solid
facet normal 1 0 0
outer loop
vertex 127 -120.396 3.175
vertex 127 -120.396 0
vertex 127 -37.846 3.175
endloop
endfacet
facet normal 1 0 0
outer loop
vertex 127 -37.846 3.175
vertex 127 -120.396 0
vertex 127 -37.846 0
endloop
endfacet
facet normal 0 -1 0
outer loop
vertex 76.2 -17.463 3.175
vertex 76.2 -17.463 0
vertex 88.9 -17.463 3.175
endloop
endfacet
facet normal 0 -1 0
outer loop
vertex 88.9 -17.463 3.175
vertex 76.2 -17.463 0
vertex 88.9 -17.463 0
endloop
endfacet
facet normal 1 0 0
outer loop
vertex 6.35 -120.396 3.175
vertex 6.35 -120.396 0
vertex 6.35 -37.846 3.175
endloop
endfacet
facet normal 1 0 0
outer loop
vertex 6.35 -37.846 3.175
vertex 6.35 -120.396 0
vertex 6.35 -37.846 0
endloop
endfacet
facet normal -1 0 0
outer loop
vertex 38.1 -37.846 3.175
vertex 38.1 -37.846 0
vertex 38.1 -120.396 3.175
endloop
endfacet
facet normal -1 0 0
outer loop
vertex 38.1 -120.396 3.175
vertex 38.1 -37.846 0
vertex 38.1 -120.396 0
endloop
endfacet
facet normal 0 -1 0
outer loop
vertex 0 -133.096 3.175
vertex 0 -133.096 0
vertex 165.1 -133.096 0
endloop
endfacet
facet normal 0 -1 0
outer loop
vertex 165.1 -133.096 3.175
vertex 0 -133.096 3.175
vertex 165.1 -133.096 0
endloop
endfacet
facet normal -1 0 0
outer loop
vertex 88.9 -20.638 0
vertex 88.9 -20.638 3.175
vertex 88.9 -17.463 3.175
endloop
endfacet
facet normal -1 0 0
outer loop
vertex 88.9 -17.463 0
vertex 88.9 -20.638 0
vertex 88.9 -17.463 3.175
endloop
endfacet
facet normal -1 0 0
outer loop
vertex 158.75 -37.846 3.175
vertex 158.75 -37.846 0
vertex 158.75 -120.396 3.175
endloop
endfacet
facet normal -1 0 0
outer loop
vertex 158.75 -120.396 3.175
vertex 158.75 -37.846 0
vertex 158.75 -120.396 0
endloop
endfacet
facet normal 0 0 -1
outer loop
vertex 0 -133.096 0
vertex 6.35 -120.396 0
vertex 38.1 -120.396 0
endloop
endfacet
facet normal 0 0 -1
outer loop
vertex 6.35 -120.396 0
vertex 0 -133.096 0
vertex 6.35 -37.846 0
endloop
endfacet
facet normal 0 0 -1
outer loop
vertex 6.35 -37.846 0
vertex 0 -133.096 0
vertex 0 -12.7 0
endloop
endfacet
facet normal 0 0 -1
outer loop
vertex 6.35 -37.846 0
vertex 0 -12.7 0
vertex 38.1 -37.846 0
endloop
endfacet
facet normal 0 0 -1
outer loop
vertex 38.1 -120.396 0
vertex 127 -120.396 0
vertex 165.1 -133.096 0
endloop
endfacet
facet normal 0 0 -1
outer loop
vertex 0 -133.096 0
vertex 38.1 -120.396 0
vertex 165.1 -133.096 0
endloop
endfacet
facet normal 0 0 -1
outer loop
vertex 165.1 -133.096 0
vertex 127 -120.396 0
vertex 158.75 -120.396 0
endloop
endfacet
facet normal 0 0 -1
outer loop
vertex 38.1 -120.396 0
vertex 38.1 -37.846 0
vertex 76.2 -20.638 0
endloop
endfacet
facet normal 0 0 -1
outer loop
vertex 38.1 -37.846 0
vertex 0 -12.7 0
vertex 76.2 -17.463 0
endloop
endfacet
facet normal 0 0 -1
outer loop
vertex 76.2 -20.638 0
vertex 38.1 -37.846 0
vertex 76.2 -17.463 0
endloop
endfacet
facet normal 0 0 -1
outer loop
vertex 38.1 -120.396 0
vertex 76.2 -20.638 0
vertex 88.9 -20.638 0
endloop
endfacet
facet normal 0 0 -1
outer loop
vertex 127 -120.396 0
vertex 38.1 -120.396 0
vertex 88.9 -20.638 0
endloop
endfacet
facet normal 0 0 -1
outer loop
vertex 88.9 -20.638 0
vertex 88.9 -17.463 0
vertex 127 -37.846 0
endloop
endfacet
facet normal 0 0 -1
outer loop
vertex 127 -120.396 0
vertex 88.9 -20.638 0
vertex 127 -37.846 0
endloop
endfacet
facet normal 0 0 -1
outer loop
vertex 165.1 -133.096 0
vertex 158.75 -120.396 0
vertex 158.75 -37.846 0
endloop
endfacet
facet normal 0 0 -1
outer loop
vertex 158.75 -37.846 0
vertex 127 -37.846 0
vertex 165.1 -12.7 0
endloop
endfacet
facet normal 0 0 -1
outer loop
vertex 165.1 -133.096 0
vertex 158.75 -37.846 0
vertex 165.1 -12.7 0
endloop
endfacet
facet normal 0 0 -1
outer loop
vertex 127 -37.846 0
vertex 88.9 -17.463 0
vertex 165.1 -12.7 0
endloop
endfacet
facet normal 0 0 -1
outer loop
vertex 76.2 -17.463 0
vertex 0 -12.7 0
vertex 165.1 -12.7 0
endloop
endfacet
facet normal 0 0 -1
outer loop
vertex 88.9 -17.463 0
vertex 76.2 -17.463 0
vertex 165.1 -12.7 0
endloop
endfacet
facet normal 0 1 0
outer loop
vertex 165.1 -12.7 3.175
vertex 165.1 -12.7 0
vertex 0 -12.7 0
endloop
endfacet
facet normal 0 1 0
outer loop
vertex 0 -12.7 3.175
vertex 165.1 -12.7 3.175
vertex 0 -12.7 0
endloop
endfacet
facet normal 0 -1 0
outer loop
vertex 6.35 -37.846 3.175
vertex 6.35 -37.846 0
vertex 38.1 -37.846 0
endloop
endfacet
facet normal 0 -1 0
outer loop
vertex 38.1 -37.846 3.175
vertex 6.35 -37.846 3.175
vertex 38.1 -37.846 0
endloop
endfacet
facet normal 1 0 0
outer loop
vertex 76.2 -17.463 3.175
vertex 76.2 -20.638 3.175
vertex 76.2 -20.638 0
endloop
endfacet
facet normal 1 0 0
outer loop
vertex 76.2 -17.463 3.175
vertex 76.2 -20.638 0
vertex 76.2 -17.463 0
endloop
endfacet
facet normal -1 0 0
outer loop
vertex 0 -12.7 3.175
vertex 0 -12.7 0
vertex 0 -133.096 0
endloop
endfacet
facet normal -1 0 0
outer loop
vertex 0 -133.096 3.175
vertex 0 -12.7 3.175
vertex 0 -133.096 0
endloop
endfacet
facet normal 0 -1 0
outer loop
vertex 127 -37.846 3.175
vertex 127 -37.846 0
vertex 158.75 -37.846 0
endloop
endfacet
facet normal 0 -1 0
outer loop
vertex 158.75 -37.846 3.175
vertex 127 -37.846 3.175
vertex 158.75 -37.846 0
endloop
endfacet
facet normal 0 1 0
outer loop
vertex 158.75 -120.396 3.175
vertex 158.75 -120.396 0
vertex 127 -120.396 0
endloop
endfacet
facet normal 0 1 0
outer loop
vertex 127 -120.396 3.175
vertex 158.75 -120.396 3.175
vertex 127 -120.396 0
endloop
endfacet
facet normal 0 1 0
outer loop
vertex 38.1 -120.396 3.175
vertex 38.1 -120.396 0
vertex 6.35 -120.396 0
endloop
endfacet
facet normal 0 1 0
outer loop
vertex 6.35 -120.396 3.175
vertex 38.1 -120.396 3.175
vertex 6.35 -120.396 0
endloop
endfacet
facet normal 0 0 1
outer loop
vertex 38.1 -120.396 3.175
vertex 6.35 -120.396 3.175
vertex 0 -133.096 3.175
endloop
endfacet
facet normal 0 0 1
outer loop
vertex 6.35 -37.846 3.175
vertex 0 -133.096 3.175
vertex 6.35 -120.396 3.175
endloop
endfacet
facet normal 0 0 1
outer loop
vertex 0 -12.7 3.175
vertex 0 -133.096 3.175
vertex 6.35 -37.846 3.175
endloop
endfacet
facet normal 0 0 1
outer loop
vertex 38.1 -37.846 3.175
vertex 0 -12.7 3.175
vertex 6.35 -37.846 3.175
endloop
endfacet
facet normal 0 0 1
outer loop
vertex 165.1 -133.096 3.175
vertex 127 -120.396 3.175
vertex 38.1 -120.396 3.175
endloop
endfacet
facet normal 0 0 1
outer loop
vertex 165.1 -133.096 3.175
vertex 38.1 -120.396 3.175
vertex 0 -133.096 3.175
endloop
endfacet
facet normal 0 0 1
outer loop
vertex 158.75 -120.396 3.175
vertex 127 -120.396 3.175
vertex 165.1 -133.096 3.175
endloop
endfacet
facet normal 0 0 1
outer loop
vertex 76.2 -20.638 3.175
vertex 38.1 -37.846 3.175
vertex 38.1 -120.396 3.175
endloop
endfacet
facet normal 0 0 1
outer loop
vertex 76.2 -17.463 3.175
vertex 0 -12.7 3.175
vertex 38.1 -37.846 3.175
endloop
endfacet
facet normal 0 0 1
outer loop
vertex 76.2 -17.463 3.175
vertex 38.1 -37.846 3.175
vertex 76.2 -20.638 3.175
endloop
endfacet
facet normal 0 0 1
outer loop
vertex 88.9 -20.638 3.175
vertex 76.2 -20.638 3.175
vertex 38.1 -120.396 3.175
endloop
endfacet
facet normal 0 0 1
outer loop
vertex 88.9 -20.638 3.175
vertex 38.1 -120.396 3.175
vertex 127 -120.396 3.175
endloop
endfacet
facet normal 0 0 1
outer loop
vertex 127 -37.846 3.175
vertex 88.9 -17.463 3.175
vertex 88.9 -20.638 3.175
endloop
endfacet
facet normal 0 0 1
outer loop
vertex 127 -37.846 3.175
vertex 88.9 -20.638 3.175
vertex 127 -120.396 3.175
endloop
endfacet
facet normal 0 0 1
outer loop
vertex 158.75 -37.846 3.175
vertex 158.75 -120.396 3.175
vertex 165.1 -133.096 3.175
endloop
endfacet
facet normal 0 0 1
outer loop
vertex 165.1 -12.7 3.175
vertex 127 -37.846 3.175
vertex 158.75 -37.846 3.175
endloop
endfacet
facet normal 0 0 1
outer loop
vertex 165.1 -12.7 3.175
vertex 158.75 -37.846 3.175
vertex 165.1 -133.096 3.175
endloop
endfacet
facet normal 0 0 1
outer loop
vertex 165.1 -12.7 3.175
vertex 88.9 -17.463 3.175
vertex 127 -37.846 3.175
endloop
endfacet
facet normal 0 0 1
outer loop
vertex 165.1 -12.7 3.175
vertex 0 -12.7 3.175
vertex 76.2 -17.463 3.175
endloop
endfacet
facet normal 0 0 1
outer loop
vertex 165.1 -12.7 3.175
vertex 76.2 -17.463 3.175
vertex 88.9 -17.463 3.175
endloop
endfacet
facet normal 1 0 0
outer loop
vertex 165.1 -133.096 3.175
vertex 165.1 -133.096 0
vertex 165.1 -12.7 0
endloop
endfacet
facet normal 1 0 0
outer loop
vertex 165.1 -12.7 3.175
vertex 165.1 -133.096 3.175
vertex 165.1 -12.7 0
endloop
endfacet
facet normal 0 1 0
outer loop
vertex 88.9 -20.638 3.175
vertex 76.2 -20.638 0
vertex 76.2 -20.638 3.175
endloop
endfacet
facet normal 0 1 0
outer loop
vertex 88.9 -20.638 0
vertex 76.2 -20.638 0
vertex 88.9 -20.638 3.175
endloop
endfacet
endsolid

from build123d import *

# Parameters (mm, degrees)
F0_W     = 12.7
F0_H     = 3.175
F1_DEPTH = 3.175


# Not quite as in the source:
# - a feature names something its author has since deleted; it is built from what else it names


with BuildPart() as f1:
    # F0 (on Top) → F1 (new body)
    with BuildSketch(Plane.XY):
        Polygon((0, -12.7), (0, -120.396), (6.35, -120.396), (6.35, -37.846), (38.1, -37.846), (38.1, -120.396), (127, -120.396), (127, -37.846), (158.75, -37.846), (158.75, -120.396), (165.1, -120.396), (165.1, -12.7), align=None)
        with Locations((82.55, -19.05)):
            Rectangle(F0_W, F0_H, mode=Mode.SUBTRACT)
        Polygon((6.35, -120.396), (0, -120.396), (0, -133.096), (165.1, -133.096), (165.1, -120.396), (158.75, -120.396), (127, -120.396), (38.1, -120.396), align=None)
    extrude(amount=F1_DEPTH)


solid = f1.part
